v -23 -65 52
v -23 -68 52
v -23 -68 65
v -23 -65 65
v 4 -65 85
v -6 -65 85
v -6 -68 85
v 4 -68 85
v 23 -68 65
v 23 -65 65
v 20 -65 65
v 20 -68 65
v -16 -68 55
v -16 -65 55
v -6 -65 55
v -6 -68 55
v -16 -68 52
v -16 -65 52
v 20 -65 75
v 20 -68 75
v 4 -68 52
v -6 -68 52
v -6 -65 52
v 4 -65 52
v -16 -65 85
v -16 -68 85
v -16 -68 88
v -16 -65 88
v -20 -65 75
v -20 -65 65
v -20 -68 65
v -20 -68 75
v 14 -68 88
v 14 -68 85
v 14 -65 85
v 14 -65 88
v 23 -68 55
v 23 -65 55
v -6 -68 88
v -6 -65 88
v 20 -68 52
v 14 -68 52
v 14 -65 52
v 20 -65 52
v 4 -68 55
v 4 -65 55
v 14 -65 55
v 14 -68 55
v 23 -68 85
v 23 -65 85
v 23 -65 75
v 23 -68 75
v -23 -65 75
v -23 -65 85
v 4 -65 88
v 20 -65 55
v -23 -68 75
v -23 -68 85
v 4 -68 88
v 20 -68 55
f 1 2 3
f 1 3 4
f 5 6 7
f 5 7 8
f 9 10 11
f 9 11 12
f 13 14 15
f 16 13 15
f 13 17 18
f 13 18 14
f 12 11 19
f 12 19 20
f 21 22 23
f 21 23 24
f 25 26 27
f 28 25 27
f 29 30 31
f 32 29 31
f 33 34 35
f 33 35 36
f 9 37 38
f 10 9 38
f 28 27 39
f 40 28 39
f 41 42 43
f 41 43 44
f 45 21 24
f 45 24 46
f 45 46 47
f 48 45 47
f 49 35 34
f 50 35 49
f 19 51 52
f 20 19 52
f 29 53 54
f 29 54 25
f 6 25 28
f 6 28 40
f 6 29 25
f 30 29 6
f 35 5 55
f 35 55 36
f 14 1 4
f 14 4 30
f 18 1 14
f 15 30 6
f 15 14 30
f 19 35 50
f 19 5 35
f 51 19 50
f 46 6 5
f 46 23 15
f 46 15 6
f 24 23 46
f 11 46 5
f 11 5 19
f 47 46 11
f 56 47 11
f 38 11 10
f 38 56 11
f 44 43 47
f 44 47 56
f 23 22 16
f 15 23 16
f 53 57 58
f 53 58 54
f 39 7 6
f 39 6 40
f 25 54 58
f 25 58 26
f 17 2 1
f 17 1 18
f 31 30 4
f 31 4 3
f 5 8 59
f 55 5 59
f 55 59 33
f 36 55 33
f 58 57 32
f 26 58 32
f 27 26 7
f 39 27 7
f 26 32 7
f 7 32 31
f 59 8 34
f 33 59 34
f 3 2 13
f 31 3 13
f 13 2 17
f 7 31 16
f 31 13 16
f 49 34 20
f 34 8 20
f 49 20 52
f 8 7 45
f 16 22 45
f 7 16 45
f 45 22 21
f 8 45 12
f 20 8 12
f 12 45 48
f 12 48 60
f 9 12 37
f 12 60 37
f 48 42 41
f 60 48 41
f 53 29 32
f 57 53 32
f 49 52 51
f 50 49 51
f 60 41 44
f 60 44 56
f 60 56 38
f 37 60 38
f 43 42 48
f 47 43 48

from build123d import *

# Parameters (mm, degrees)
RECTANGLE160_W                          = 3
RECTANGLE160_H                          = 10
EXTRUDE207_DEPTH                        = 3
EXTRUDE206_DEPTH                        = 3
RECTANGLE062_AS_DRAWN_W                 = 7
RECTANGLE062_AS_DRAWN_H                 = 3
EXTRUDE072_DEPTH                        = 3
EXTRUDE072_ONTO_RECTANGLE062_ROLL_ANGLE = 90
RECTANGLE060_AS_DRAWN_W                 = 10
RECTANGLE060_AS_DRAWN_H                 = 3
EXTRUDE070_DEPTH                        = 3
EXTRUDE070_ONTO_RECTANGLE060_ROLL_ANGLE = 90
RECTANGLE058_AS_DRAWN_W                 = 6
RECTANGLE058_AS_DRAWN_H                 = 3
EXTRUDE068_DEPTH                        = 3
EXTRUDE068_ONTO_RECTANGLE058_ROLL_ANGLE = 90
BOX006_W                                = 46
BOX006_H                                = 3
BOX006_DEPTH                            = 30
RECTANGLE067_AS_DRAWN_W                 = 10
RECTANGLE067_AS_DRAWN_H                 = 3
EXTRUDE077_DEPTH                        = 3
EXTRUDE077_ONTO_RECTANGLE067_ROLL_ANGLE = 90
RECTANGLE066_AS_DRAWN_W                 = 10
RECTANGLE066_AS_DRAWN_H                 = 3
EXTRUDE076_DEPTH                        = 3
EXTRUDE076_ONTO_RECTANGLE066_ROLL_ANGLE = 90


with BuildPart() as extrude207:
    # Rectangle160 → Extrude207 (new body)
    with BuildSketch(Plane(origin=(24, -68, 75), x_dir=(0, -1, 0), z_dir=(1, 0, 0))):
        with Locations((-1.5, 5)):
            Rectangle(RECTANGLE160_W, RECTANGLE160_H)
    extrude(amount=-EXTRUDE207_DEPTH)


with BuildPart() as extrude207_1:
    # Extrude207 placement: moved
    add(extrude207.part.moved(Location((-44, 0, 0))))


with BuildPart() as fusion064065:
    # Rectangle160 → Extrude206 (new body)
    with BuildSketch(Plane(origin=(24, -68, 75), x_dir=(0, -1, 0), z_dir=(1, 0, 0))):
        with Locations((-1.5, 5)):
            Rectangle(RECTANGLE160_W, RECTANGLE160_H)
    extrude(amount=-EXTRUDE206_DEPTH)


with BuildPart() as fusion064065_1:
    # Extrude206 placement: moved
    add(fusion064065.part.moved(Location((-1, 0, 0))))

    # Fusion064065: union Extrude207
    add(extrude207_1.part)


with BuildPart() as extrude072:
    # Rectangle062 as drawn → Extrude072 (new)
    with BuildSketch(Plane.XY):
        with Locations((-3.5, -1.5)):
            Rectangle(RECTANGLE062_AS_DRAWN_W, RECTANGLE062_AS_DRAWN_H)
    extrude(amount=-EXTRUDE072_DEPTH)


with BuildPart() as extrude072_1:
    # Extrude072 onto Rectangle062 roll: moved
    add(extrude072.part.rotate(Axis((0, 0, 0), (1, 0, 0)), EXTRUDE072_ONTO_RECTANGLE062_ROLL_ANGLE))


with BuildPart() as extrude072_2:
    # Extrude072 onto Rectangle062 placement: moved
    add(extrude072_1.part.moved(Location((-16, -68, 55))))


with BuildPart() as extrude070:
    # Rectangle060 as drawn → Extrude070 (new)
    with BuildSketch(Plane.XY):
        with Locations((-5, -1.5)):
            Rectangle(RECTANGLE060_AS_DRAWN_W, RECTANGLE060_AS_DRAWN_H)
    extrude(amount=-EXTRUDE070_DEPTH)


with BuildPart() as extrude070_1:
    # Extrude070 onto Rectangle060 roll: moved
    add(extrude070.part.rotate(Axis((0, 0, 0), (1, 0, 0)), EXTRUDE070_ONTO_RECTANGLE060_ROLL_ANGLE))


with BuildPart() as extrude070_2:
    # Extrude070 onto Rectangle060 placement: moved
    add(extrude070_1.part.moved(Location((4, -68, 55))))


with BuildPart() as finger_joints_aa:
    # Rectangle058 as drawn → Extrude068 (new)
    with BuildSketch(Plane.XY):
        with Locations((-3, -1.5)):
            Rectangle(RECTANGLE058_AS_DRAWN_W, RECTANGLE058_AS_DRAWN_H)
    extrude(amount=-EXTRUDE068_DEPTH)


with BuildPart() as finger_joints_aa_1:
    # Extrude068 onto Rectangle058 roll: moved
    add(finger_joints_aa.part.rotate(Axis((0, 0, 0), (1, 0, 0)), EXTRUDE068_ONTO_RECTANGLE058_ROLL_ANGLE))


with BuildPart() as finger_joints_aa_2:
    # Extrude068 onto Rectangle058 placement: moved
    add(finger_joints_aa_1.part.moved(Location((20, -68, 55))))

    # Fusion054: union Extrude072, Extrude070
    add(extrude072_2.part)
    add(extrude070_2.part)


with BuildPart() as carraige_side_panel:
    # Box006 → Box006 (new body)
    with BuildSketch(Plane(origin=(-23, -68, 55), x_dir=(1, 0, 0), z_dir=(0, 0, 1))):
        with Locations((23, 1.5)):
            Rectangle(BOX006_W, BOX006_H)
    extrude(amount=BOX006_DEPTH)


with BuildPart() as finger_joints_bb002:
    # Rectangle067 as drawn → Extrude077 (new)
    with BuildSketch(Plane.XY):
        with Locations((-5, -1.5)):
            Rectangle(RECTANGLE067_AS_DRAWN_W, RECTANGLE067_AS_DRAWN_H)
    extrude(amount=-EXTRUDE077_DEPTH)


with BuildPart() as finger_joints_bb002_1:
    # Extrude077 onto Rectangle067 roll: moved
    add(finger_joints_bb002.part.rotate(Axis((0, 0, 0), (1, 0, 0)), EXTRUDE077_ONTO_RECTANGLE067_ROLL_ANGLE))


with BuildPart() as finger_joints_bb002_2:
    # Extrude077 onto Rectangle067 placement: moved
    add(finger_joints_bb002_1.part.moved(Location((-6, -68, 55))))


with BuildPart() as cut035055:
    # Rectangle066 as drawn → Extrude076 (new)
    with BuildSketch(Plane.XY):
        with Locations((-5, -1.5)):
            Rectangle(RECTANGLE066_AS_DRAWN_W, RECTANGLE066_AS_DRAWN_H)
    extrude(amount=-EXTRUDE076_DEPTH)


with BuildPart() as cut035055_1:
    # Extrude076 onto Rectangle066 roll: moved
    add(cut035055.part.rotate(Axis((0, 0, 0), (1, 0, 0)), EXTRUDE076_ONTO_RECTANGLE066_ROLL_ANGLE))


with BuildPart() as cut035055_2:
    # Extrude076 onto Rectangle066 placement: moved
    add(cut035055_1.part.moved(Location((14, -68, 55))))

    # Fusion057: union Finger joints bb002
    add(finger_joints_bb002_2.part)


with BuildPart() as cut035055_3:
    # Fusion057 placement: moved
    add(cut035055_2.part.moved(Location((0, 0, 33))))

    # Fusion059: union Finger joints aa, Carraige side panel
    add(finger_joints_aa_2.part)
    add(carraige_side_panel.part)

    # Cut035055: cut Fusion064065
    add(fusion064065_1.part, mode=Mode.SUBTRACT)


solid = cut035055_3.part
